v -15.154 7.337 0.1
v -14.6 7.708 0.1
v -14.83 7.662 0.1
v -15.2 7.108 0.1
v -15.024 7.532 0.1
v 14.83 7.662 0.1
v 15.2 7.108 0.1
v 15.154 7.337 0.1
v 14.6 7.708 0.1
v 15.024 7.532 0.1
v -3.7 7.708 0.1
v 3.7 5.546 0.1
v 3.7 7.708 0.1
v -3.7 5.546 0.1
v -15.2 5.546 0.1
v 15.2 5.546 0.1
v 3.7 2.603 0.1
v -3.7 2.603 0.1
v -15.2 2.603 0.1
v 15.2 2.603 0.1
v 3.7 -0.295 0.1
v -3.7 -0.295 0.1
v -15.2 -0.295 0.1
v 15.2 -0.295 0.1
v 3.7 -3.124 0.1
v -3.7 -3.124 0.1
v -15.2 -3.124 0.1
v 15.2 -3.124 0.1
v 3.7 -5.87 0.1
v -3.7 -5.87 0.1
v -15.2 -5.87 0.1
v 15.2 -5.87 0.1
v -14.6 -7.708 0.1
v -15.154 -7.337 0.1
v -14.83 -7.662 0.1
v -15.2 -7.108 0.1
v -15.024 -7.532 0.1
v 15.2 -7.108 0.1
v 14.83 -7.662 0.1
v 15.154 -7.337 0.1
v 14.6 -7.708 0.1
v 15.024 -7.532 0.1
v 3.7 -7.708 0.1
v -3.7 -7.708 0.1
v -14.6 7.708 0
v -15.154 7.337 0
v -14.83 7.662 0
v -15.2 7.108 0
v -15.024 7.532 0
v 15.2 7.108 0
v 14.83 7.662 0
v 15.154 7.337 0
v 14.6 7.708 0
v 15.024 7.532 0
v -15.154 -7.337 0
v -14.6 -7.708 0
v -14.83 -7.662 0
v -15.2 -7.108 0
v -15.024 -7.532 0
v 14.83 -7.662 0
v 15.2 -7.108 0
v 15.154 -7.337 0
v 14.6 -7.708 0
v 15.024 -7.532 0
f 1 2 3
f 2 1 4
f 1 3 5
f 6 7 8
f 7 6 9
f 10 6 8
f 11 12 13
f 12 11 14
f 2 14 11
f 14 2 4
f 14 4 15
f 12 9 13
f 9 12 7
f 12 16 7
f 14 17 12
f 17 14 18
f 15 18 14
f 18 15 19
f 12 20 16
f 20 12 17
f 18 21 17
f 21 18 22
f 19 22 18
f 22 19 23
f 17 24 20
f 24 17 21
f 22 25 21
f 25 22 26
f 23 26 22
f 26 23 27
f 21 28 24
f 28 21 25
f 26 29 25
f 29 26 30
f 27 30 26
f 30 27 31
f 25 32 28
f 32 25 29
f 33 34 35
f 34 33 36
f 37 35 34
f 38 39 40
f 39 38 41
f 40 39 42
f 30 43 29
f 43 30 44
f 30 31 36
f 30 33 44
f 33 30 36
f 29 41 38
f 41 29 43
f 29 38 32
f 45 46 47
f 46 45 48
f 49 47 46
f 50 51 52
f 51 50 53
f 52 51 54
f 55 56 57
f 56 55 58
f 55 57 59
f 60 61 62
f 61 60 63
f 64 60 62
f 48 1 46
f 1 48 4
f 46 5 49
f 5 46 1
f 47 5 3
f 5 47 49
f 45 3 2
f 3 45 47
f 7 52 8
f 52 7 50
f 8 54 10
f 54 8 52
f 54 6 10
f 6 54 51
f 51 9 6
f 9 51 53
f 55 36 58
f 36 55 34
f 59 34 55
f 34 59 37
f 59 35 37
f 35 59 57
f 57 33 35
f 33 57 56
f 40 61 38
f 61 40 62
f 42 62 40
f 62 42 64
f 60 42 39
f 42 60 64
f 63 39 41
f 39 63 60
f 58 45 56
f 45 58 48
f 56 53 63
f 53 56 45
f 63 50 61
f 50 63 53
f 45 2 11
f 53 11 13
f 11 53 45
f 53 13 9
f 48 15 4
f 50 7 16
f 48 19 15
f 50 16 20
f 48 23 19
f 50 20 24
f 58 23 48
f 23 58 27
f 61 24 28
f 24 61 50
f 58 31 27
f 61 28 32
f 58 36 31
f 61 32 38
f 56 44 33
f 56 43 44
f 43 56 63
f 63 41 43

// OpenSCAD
// file: ../p/1-4cyli.scad
use <../lib.scad>
function ldraw_lib__1_4cyli() = [
// 0 Cylinder 0.25
// 0 Name: 1-4cyli.dat
// 0 Author: James Jessiman
// 0 !LDRAW_ORG Primitive UPDATE 2012-01
// 0 !LICENSE Licensed under CC BY 2.0 and CC BY 4.0 : see CAreadme.txt
// 
// 0 BFC CERTIFY CCW
  [0,"BFC","CERTIFY"],
  [0,"BFC","CCW"],
// 
// 0 !HISTORY 2002-03-23 [sbliss] Added BFC statement.
// 0 !HISTORY 2002-04-25 [PTadmin] Official Update 2002-02
// 0 !HISTORY 2007-06-22 [PTadmin] Header formatted for Contributor Agreement
// 0 !HISTORY 2008-07-01 [PTadmin] Official Update 2008-01
// 0 !HISTORY 2012-02-16 [Philo] Changed to CCW
// 0 !HISTORY 2012-03-30 [PTadmin] Official Update 2012-01
// 
// 
// 4 16 1 1 0 0.9239 1 0.3827 0.9239 0 0.3827 1 0 0
  [4,16,1,1,0,0.9239,1,0.3827,0.9239,0,0.3827,1,0,0],
// 5 24 1 0 0 1 1 0 0.9239 0 0.3827 1 0 -1
  [5,24,1,0,0,1,1,0,0.9239,0,0.3827,1,0,-1],
// 4 16 0.9239 1 0.3827 0.7071 1 0.7071 0.7071 0 0.7071 0.9239 0 0.3827
  [4,16,0.9239,1,0.3827,0.7071,1,0.7071,0.7071,0,0.7071,0.9239,0,0.3827],
// 5 24 0.9239 0 0.3827 0.9239 1 0.3827 0.7071 0 0.7071 1 0 0
  [5,24,0.9239,0,0.3827,0.9239,1,0.3827,0.7071,0,0.7071,1,0,0],
// 4 16 0.7071 1 0.7071 0.3827 1 0.9239 0.3827 0 0.9239 0.7071 0 0.7071
  [4,16,0.7071,1,0.7071,0.3827,1,0.9239,0.3827,0,0.9239,0.7071,0,0.7071],
// 5 24 0.7071 0 0.7071 0.7071 1 0.7071 0.3827 0 0.9239 0.9239 0 0.3827
  [5,24,0.7071,0,0.7071,0.7071,1,0.7071,0.3827,0,0.9239,0.9239,0,0.3827],
// 4 16 0.3827 1 0.9239 0 1 1 0 0 1 0.3827 0 0.9239
  [4,16,0.3827,1,0.9239,0,1,1,0,0,1,0.3827,0,0.9239],
// 5 24 0.3827 0 0.9239 0.3827 1 0.9239 0 0 1 0.7071 0 0.7071
  [5,24,0.3827,0,0.9239,0.3827,1,0.9239,0,0,1,0.7071,0,0.7071],
// 5 24 0 0 1 0 1 1 0.3827 0 0.9239 -1 0 1
  [5,24,0,0,1,0,1,1,0.3827,0,0.9239,-1,0,1],
];
makepoly(ldraw_lib__1_4cyli(), line=0.2);
// file: ../p/1-4chrd.scad
use <../lib.scad>
function ldraw_lib__1_4chrd() = [
// 0 Chord 0.25
// 0 Name: 1-4chrd.dat
// 0 Author: Tony Hafner [hafhead]
// 0 !LDRAW_ORG Primitive UPDATE 2012-02
// 0 !LICENSE Licensed under CC BY 2.0 and CC BY 4.0 : see CAreadme.txt
// 
// 0 BFC CERTIFY CCW
  [0,"BFC","CERTIFY"],
  [0,"BFC","CCW"],
// 
// 0 !HISTORY 2004-04-22 [PTadmin] Official Update 2004-02
// 0 !HISTORY 2007-10-09 [PTadmin] Header formatted for Contributor Agreement
// 0 !HISTORY 2008-07-01 [PTadmin] Official Update 2008-01
// 0 !HISTORY 2012-08-02 [MMR1988] Re-creation with PrimGen2 and Rectifier
// 0 !HISTORY 2012-08-09 [PTadmin] Official Update 2012-02
// 
// 
// 4 16 0.9239 0 0.3827 0.3827 0 0.9239 0 0 1 1 0 0
  [4,16,0.9239,0,0.3827,0.3827,0,0.9239,0,0,1,1,0,0],
// 3 16 0.7071 0 0.7071 0.3827 0 0.9239 0.9239 0 0.3827
  [3,16,0.7071,0,0.7071,0.3827,0,0.9239,0.9239,0,0.3827],
];
makepoly(ldraw_lib__1_4chrd(), line=0.2);
// file: s/6142617es07.scad
use <../../lib.scad>
use <../../p/1-4chrd.scad>
use <../../p/1-4cyli.scad>
function ldraw_lib__s__6142617es07() = [
// 0 ~Sticker  1.9 x  3.8 with Black Stripe on White Background - Bottom Face
// 0 Name: s\6142617es07.dat
// 0 Author: Massimo Maso [Sirio]
// 0 !LDRAW_ORG Subpart UPDATE 2022-05
// 0 !LICENSE Licensed under CC BY 2.0 and CC BY 4.0 : see CAreadme.txt
// 
// 0 BFC CERTIFY CCW
  [0,"BFC","CERTIFY"],
  [0,"BFC","CCW"],
// 
// 0 !HISTORY 2022-09-15 [PTadmin] Official Update 2022-05
// 
// 
// 0 // Primitives
// 
// 1 16 -36.5 0 17.7691 -1.5 0 0 0 -1 0 0 0 1.5 1-4chrd.dat
  [1,16,-36.5,0,17.7691,-1.5,0,0,0,-1,0,0,0,1.5, ldraw_lib__1_4chrd()],
// 1 16 36.5 0 17.7691 1.5 0 0 0 -1 0 0 0 1.5 1-4chrd.dat
  [1,16,36.5,0,17.7691,1.5,0,0,0,-1,0,0,0,1.5, ldraw_lib__1_4chrd()],
// 1 16 -36.5 0 -17.7691 -1.5 0 0 0 -1 0 0 0 -1.5 1-4chrd.dat
  [1,16,-36.5,0,-17.7691,-1.5,0,0,0,-1,0,0,0,-1.5, ldraw_lib__1_4chrd()],
// 1 16 36.5 0 -17.7691 1.5 0 0 0 -1 0 0 0 -1.5 1-4chrd.dat
  [1,16,36.5,0,-17.7691,1.5,0,0,0,-1,0,0,0,-1.5, ldraw_lib__1_4chrd()],
// 1 16 -36.5 -0.25 17.7691 -1.5 0 0 0 0.25 0 0 0 1.5 1-4cyli.dat
  [1,16,-36.5,-0.25,17.7691,-1.5,0,0,0,0.25,0,0,0,1.5, ldraw_lib__1_4cyli()],
// 1 16 36.5 -0.25 17.7691 1.5 0 0 0 0.25 0 0 0 1.5 1-4cyli.dat
  [1,16,36.5,-0.25,17.7691,1.5,0,0,0,0.25,0,0,0,1.5, ldraw_lib__1_4cyli()],
// 1 16 -36.5 -0.25 -17.7691 -1.5 0 0 0 0.25 0 0 0 -1.5 1-4cyli.dat
  [1,16,-36.5,-0.25,-17.7691,-1.5,0,0,0,0.25,0,0,0,-1.5, ldraw_lib__1_4cyli()],
// 1 16 36.5 -0.25 -17.7691 1.5 0 0 0 0.25 0 0 0 -1.5 1-4cyli.dat
  [1,16,36.5,-0.25,-17.7691,1.5,0,0,0,0.25,0,0,0,-1.5, ldraw_lib__1_4cyli()],
// 0 // Bottom face
// 4 16 -36.5 0 19.2691 -36.5 0 -19.2691 -38 0 -17.7691 -38 0 17.7691
  [4,16,-36.5,0,19.2691,-36.5,0,-19.2691,-38,0,-17.7691,-38,0,17.7691],
// 4 16 -36.5 0 19.2691 36.5 0 19.2691 36.5 0 -19.2691 -36.5 0 -19.2691
  [4,16,-36.5,0,19.2691,36.5,0,19.2691,36.5,0,-19.2691,-36.5,0,-19.2691],
// 4 16 36.5 0 19.2691 38 0 17.7691 38 0 -17.7691 36.5 0 -19.2691
  [4,16,36.5,0,19.2691,38,0,17.7691,38,0,-17.7691,36.5,0,-19.2691],
// 0 // Lateral face
// 3 16 -36.5 0 19.2691 -36.5 -.25 19.2691 -9.25 -.25 19.2691
  [3,16,-36.5,0,19.2691,-36.5,-.25,19.2691,-9.25,-.25,19.2691],
// 4 16 -36.5 0 19.2691 -9.25 -.25 19.2691 9.25 -.25 19.2691 36.5 0 19.2691
  [4,16,-36.5,0,19.2691,-9.25,-.25,19.2691,9.25,-.25,19.2691,36.5,0,19.2691],
// 3 16 36.5 0 19.2691 9.25 -.25 19.2691 36.5 -.25 19.2691
  [3,16,36.5,0,19.2691,9.25,-.25,19.2691,36.5,-.25,19.2691],
// 3 16 -38 0 17.7691 -38 -.25 13.8648 -38 -.25 17.7691
  [3,16,-38,0,17.7691,-38,-.25,13.8648,-38,-.25,17.7691],
// 3 16 38 0 17.7691 38 -.25 17.7691 38 -.25 13.8648
  [3,16,38,0,17.7691,38,-.25,17.7691,38,-.25,13.8648],
// 3 16 -38 0 17.7691 -38 -.25 6.5068 -38 -.25 13.8648
  [3,16,-38,0,17.7691,-38,-.25,6.5068,-38,-.25,13.8648],
// 3 16 38 0 17.7691 38 -.25 13.8648 38 -.25 6.5068
  [3,16,38,0,17.7691,38,-.25,13.8648,38,-.25,6.5068],
// 3 16 -38 0 17.7691 -38 -.25 -.7365 -38 -.25 6.5068
  [3,16,-38,0,17.7691,-38,-.25,-.7365,-38,-.25,6.5068],
// 3 16 38 0 17.7691 38 -.25 6.5068 38 -.25 -.7365
  [3,16,38,0,17.7691,38,-.25,6.5068,38,-.25,-.7365],
// 4 16 -38 0 17.7691 -38 0 -17.7691 -38 -.25 -7.8105 -38 -.25 -.7365
  [4,16,-38,0,17.7691,-38,0,-17.7691,-38,-.25,-7.8105,-38,-.25,-.7365],
// 4 16 38 0 17.7691 38 -.25 -.7365 38 -.25 -7.8105 38 0 -17.7691
  [4,16,38,0,17.7691,38,-.25,-.7365,38,-.25,-7.8105,38,0,-17.7691],
// 3 16 -38 0 -17.7691 -38 -.25 -14.6749 -38 -.25 -7.8105
  [3,16,-38,0,-17.7691,-38,-.25,-14.6749,-38,-.25,-7.8105],
// 3 16 38 0 -17.7691 38 -.25 -7.8105 38 -.25 -14.6749
  [3,16,38,0,-17.7691,38,-.25,-7.8105,38,-.25,-14.6749],
// 3 16 -38 0 -17.7691 -38 -.25 -17.7691 -38 -.25 -14.6749
  [3,16,-38,0,-17.7691,-38,-.25,-17.7691,-38,-.25,-14.6749],
// 3 16 38 0 -17.7691 38 -.25 -14.6749 38 -.25 -17.7691
  [3,16,38,0,-17.7691,38,-.25,-14.6749,38,-.25,-17.7691],
// 3 16 -36.5 0 -19.2691 -9.25 -.25 -19.2691 -36.5 -.25 -19.2691
  [3,16,-36.5,0,-19.2691,-9.25,-.25,-19.2691,-36.5,-.25,-19.2691],
// 4 16 -36.5 0 -19.2691 36.5 0 -19.2691 9.25 -.25 -19.2691 -9.25 -.25 -19.2691
  [4,16,-36.5,0,-19.2691,36.5,0,-19.2691,9.25,-.25,-19.2691,-9.25,-.25,-19.2691],
// 3 16 36.5 0 -19.2691 36.5 -.25 -19.2691 9.25 -.25 -19.2691
  [3,16,36.5,0,-19.2691,36.5,-.25,-19.2691,9.25,-.25,-19.2691],
];
makepoly(ldraw_lib__s__6142617es07(), line=0.2);
// file: s/6142617es06.scad
use <../../lib.scad>
use <../../p/1-4chrd.scad>
function ldraw_lib__s__6142617es06() = [
// 0 ~Sticker  1.9 x  3.8 with Black Stripe on White Background - Sixth Face
// 0 Name: s\6142617es06.dat
// 0 Author: Massimo Maso [Sirio]
// 0 !LDRAW_ORG Subpart UPDATE 2022-05
// 0 !LICENSE Licensed under CC BY 2.0 and CC BY 4.0 : see CAreadme.txt
// 
// 0 BFC CERTIFY CCW
  [0,"BFC","CERTIFY"],
  [0,"BFC","CCW"],
// 
// 0 !HISTORY 2022-09-15 [PTadmin] Official Update 2022-05
// 
// 
// 0 // Primitives
// 
// 1 15 -36.5 -.25 -3.0797 -1.5 0 0 0 1 0 0 0 -1.5 1-4chrd.dat
  [1,15,-36.5,-.25,-3.0797,-1.5,0,0,0,1,0,0,0,-1.5, ldraw_lib__1_4chrd()],
// 1 15 36.5 -.25 -3.0797 1.5 0 0 0 1 0 0 0 -1.5 1-4chrd.dat
  [1,15,36.5,-.25,-3.0797,1.5,0,0,0,1,0,0,0,-1.5, ldraw_lib__1_4chrd()],
// 0 // Blue face
// 4 0 -9.25 -.25 .0145 -9.25 -.25 -4.5797 9.25 -.25 -4.5797 9.25 -.25 .0145
  [4,0,-9.25,-.25,.0145,-9.25,-.25,-4.5797,9.25,-.25,-4.5797,9.25,-.25,.0145],
// 0 // White faces
// 3 15 -9.25 -.25 .0145 -38 -.25 .0145 -38 -.25 -3.0797
  [3,15,-9.25,-.25,.0145,-38,-.25,.0145,-38,-.25,-3.0797],
// 4 15 -9.25 -.25 .0145 -38 -.25 -3.0797 -36.5 -.25 -4.5797 -9.25 -.25 -4.5797
  [4,15,-9.25,-.25,.0145,-38,-.25,-3.0797,-36.5,-.25,-4.5797,-9.25,-.25,-4.5797],
// 4 15 9.25 -.25 .0145 9.25 -.25 -4.5797 36.5 -.25 -4.5797 38 -.25 -3.0797
  [4,15,9.25,-.25,.0145,9.25,-.25,-4.5797,36.5,-.25,-4.5797,38,-.25,-3.0797],
// 3 15 9.25 -.25 .0145 38 -.25 -3.0797 38 -.25 .0145
  [3,15,9.25,-.25,.0145,38,-.25,-3.0797,38,-.25,.0145],
];
makepoly(ldraw_lib__s__6142617es06(), line=0.2);
// file: s/6142617es05.scad
use <../../lib.scad>
function ldraw_lib__s__6142617es05() = [
// 0 ~Sticker  1.9 x  3.8 with Black Stripe on White Background - Fifth Face
// 0 Name: s\6142617es05.dat
// 0 Author: Massimo Maso [Sirio]
// 0 !LDRAW_ORG Subpart UPDATE 2022-05
// 0 !LICENSE Licensed under CC BY 2.0 and CC BY 4.0 : see CAreadme.txt
// 
// 0 BFC CERTIFY CCW
  [0,"BFC","CERTIFY"],
  [0,"BFC","CCW"],
// 
// 0 !HISTORY 2022-09-15 [PTadmin] Official Update 2022-05
// 
// 
// 0 // Black face
// 
// 4 0 -9.25 -.25 6.8499 -9.25 -.25 -.0145 9.25 -.25 -.0145 9.25 -.25 6.8499
  [4,0,-9.25,-.25,6.8499,-9.25,-.25,-.0145,9.25,-.25,-.0145,9.25,-.25,6.8499],
// 0 // White faces
// 4 15 -9.25 -.25 6.8499 -38 -.25 6.8499 -38 -.25 -.0145 -9.25 -.25 -.0145
  [4,15,-9.25,-.25,6.8499,-38,-.25,6.8499,-38,-.25,-.0145,-9.25,-.25,-.0145],
// 4 15 38 -.25 -.0145 38 -.25 6.8499 9.25 -.25 6.8499 9.25 -.25 -.0145
  [4,15,38,-.25,-.0145,38,-.25,6.8499,9.25,-.25,6.8499,9.25,-.25,-.0145],
];
makepoly(ldraw_lib__s__6142617es05(), line=0.2);
// file: s/6142617es04.scad
use <../../lib.scad>
function ldraw_lib__s__6142617es04() = [
// 0 ~Sticker  1.9 x  3.8 with Black Stripe on White Background - Fourth Face
// 0 Name: s\6142617es04.dat
// 0 Author: Massimo Maso [Sirio]
// 0 !LDRAW_ORG Subpart UPDATE 2022-05
// 0 !LICENSE Licensed under CC BY 2.0 and CC BY 4.0 : see CAreadme.txt
// 
// 0 BFC CERTIFY CCW
  [0,"BFC","CERTIFY"],
  [0,"BFC","CCW"],
// 
// 0 !HISTORY 2022-09-15 [PTadmin] Official Update 2022-05
// 
// 
// 0 // Black face
// 
// 4 0 -9.25 -.25 .0128 -9.25 -.25 -7.0612 9.25 -.25 -7.0612 9.25 -.25 .0128
  [4,0,-9.25,-.25,.0128,-9.25,-.25,-7.0612,9.25,-.25,-7.0612,9.25,-.25,.0128],
// 0 // White faces
// 4 15 -9.25 -.25 .0128 -38 -.25 .0128 -38 -.25 -7.0612 -9.25 -.25 -7.0612
  [4,15,-9.25,-.25,.0128,-38,-.25,.0128,-38,-.25,-7.0612,-9.25,-.25,-7.0612],
// 4 15 38 -.25 -7.0612 38 -.25 .0128 9.25 -.25 .0128 9.25 -.25 -7.0612
  [4,15,38,-.25,-7.0612,38,-.25,.0128,9.25,-.25,.0128,9.25,-.25,-7.0612],
];
makepoly(ldraw_lib__s__6142617es04(), line=0.2);
// file: s/6142617es03.scad
use <../../lib.scad>
function ldraw_lib__s__6142617es03() = [
// 0 ~Sticker  1.9 x  3.8 with Black Stripe on White Background - Third Face
// 0 Name: s\6142617es03.dat
// 0 Author: Massimo Maso [Sirio]
// 0 !LDRAW_ORG Subpart UPDATE 2022-05
// 0 !LICENSE Licensed under CC BY 2.0 and CC BY 4.0 : see CAreadme.txt
// 
// 0 BFC CERTIFY CCW
  [0,"BFC","CERTIFY"],
  [0,"BFC","CCW"],
// 
// 0 !HISTORY 2022-09-15 [PTadmin] Official Update 2022-05
// 
// 
// 0 // Black face
// 
// 4 0 -9.25 -.25 7.2305 -9.25 -.25 -.0128 9.25 -.25 -.0128 9.25 -.25 7.2305
  [4,0,-9.25,-.25,7.2305,-9.25,-.25,-.0128,9.25,-.25,-.0128,9.25,-.25,7.2305],
// 0 // White faces
// 4 15 -9.25 -.25 7.2305 -38 -.25 7.2305 -38 -.25 -.0128 -9.25 -.25 -.0128
  [4,15,-9.25,-.25,7.2305,-38,-.25,7.2305,-38,-.25,-.0128,-9.25,-.25,-.0128],
// 4 15 38 -.25 -.0128 38 -.25 7.2305 9.25 -.25 7.2305 9.25 -.25 -.0128
  [4,15,38,-.25,-.0128,38,-.25,7.2305,9.25,-.25,7.2305,9.25,-.25,-.0128],
];
makepoly(ldraw_lib__s__6142617es03(), line=0.2);
// file: s/6142617es02.scad
use <../../lib.scad>
function ldraw_lib__s__6142617es02() = [
// 0 ~Sticker  1.9 x  3.8 with Black Stripe on White Background - Second Face
// 0 Name: s\6142617es02.dat
// 0 Author: Massimo Maso [Sirio]
// 0 !LDRAW_ORG Subpart UPDATE 2022-05
// 0 !LICENSE Licensed under CC BY 2.0 and CC BY 4.0 : see CAreadme.txt
// 
// 0 BFC CERTIFY CCW
  [0,"BFC","CERTIFY"],
  [0,"BFC","CCW"],
// 
// 0 !HISTORY 2022-09-15 [PTadmin] Official Update 2022-05
// 
// 
// 0 // Black face
// 
// 4 0 -9.25 -.25 -7.3463 9.25 -.25 -7.3463 9.25 -.25 .0117 -9.25 -.25 .0117
  [4,0,-9.25,-.25,-7.3463,9.25,-.25,-7.3463,9.25,-.25,.0117,-9.25,-.25,.0117],
// 0 // White faces
// 4 15 -9.25 -.25 .0117 -38 -.25 .0117 -38 -.25 -7.3463 -9.25 -.25 -7.3463
  [4,15,-9.25,-.25,.0117,-38,-.25,.0117,-38,-.25,-7.3463,-9.25,-.25,-7.3463],
// 4 15 38 -.25 -7.3463 38 -.25 .0117 9.25 -.25 .0117 9.25 -.25 -7.3463
  [4,15,38,-.25,-7.3463,38,-.25,.0117,9.25,-.25,.0117,9.25,-.25,-7.3463],
];
makepoly(ldraw_lib__s__6142617es02(), line=0.2);
// file: s/6142617es01.scad
use <../../lib.scad>
use <../../p/1-4chrd.scad>
function ldraw_lib__s__6142617es01() = [
// 0 ~Sticker  1.9 x  3.8 with Black Stripe on White Background - First Face
// 0 Name: s\6142617es01.dat
// 0 Author: Massimo Maso [Sirio]
// 0 !LDRAW_ORG Subpart UPDATE 2022-05
// 0 !LICENSE Licensed under CC BY 2.0 and CC BY 4.0 : see CAreadme.txt
// 
// 0 BFC CERTIFY CCW
  [0,"BFC","CERTIFY"],
  [0,"BFC","CCW"],
// 
// 0 !HISTORY 2022-09-15 [PTadmin] Official Update 2022-05
// 
// 
// 0 // Primitives
// 
// 1 15 -36.5 -.25 3.8926 -1.5 0 0 0 1 0 0 0 1.5 1-4chrd.dat
  [1,15,-36.5,-.25,3.8926,-1.5,0,0,0,1,0,0,0,1.5, ldraw_lib__1_4chrd()],
// 1 15 36.5 -.25 3.8926 1.5 0 0 0 1 0 0 0 1.5 1-4chrd.dat
  [1,15,36.5,-.25,3.8926,1.5,0,0,0,1,0,0,0,1.5, ldraw_lib__1_4chrd()],
// 0 // Black face
// 4 0 -9.25 -.25 -.0117 9.25 -.25 -.0117 9.25 -.25 5.3926 -9.25 -.25 5.3926
  [4,0,-9.25,-.25,-.0117,9.25,-.25,-.0117,9.25,-.25,5.3926,-9.25,-.25,5.3926],
// 0 // White Faces
// 4 15 -9.25 -.25 -.0117 -9.25 -.25 5.3926 -36.5 -.25 5.3926 -38 -.25 3.8926
  [4,15,-9.25,-.25,-.0117,-9.25,-.25,5.3926,-36.5,-.25,5.3926,-38,-.25,3.8926],
// 3 15 -9.25 -.25 -.0117 -38 -.25 3.8926 -38 -.25 -.0117
  [3,15,-9.25,-.25,-.0117,-38,-.25,3.8926,-38,-.25,-.0117],
// 4 15 9.25 -.25 -.0117 38 -.25 3.8926 36.5 -.25 5.3926 9.25 -.25 5.3926
  [4,15,9.25,-.25,-.0117,38,-.25,3.8926,36.5,-.25,5.3926,9.25,-.25,5.3926],
// 3 15 9.25 -.25 -.0117 38 -.25 -.0117 38 -.25 3.8926
  [3,15,9.25,-.25,-.0117,38,-.25,-.0117,38,-.25,3.8926],
];
makepoly(ldraw_lib__s__6142617es01(), line=0.2);
// main file
use <../lib.scad>
use <s/6142617es01.scad>
use <s/6142617es02.scad>
use <s/6142617es03.scad>
use <s/6142617es04.scad>
use <s/6142617es05.scad>
use <s/6142617es06.scad>
use <s/6142617es07.scad>
function ldraw_lib__6142617e() = [
// 0 Sticker  1.9 x  3.8 with Black Stripe on White Background
// 0 Name: 6142617e.dat
// 0 Author: Massimo Maso [Sirio]
// 0 !LDRAW_ORG Part UPDATE 2022-05
// 0 !LICENSE Licensed under CC BY 2.0 and CC BY 4.0 : see CAreadme.txt
// 
// 0 BFC CERTIFY CCW
  [0,"BFC","CERTIFY"],
  [0,"BFC","CCW"],
// 
// 0 !KEYWORDS 1969, Camaro, Chevrolet, Drag, Race, Set 75874, Speed Champions
// 0 !KEYWORDS Z/28
// 
// 0 !HISTORY 2022-09-15 [PTadmin] Official Update 2022-05
// 
// 
// 1 16 0 0 13.8765 1 0 0 0 1 0 0 0 1 s\6142617es01.dat
  [1,16,0,0,13.8765,1,0,0,0,1,0,0,0,1, ldraw_lib__s__6142617es01()],
// 1 16 0 0 13.8531 1 0 0 0 1 0 0 0 1 s\6142617es02.dat
  [1,16,0,0,13.8531,1,0,0,0,1,0,0,0,1, ldraw_lib__s__6142617es02()],
// 1 16 0 0 -.7237 1 0 0 0 1 0 0 0 1 s\6142617es03.dat
  [1,16,0,0,-.7237,1,0,0,0,1,0,0,0,1, ldraw_lib__s__6142617es03()],
// 1 16 0 0 -.7493 1 0 0 0 1 0 0 0 1 s\6142617es04.dat
  [1,16,0,0,-.7493,1,0,0,0,1,0,0,0,1, ldraw_lib__s__6142617es04()],
// 1 16 0 0 -14.6604 1 0 0 0 1 0 0 0 1 s\6142617es05.dat
  [1,16,0,0,-14.6604,1,0,0,0,1,0,0,0,1, ldraw_lib__s__6142617es05()],
// 1 16 0 0 -14.6894 1 0 0 0 1 0 0 0 1 s\6142617es06.dat
  [1,16,0,0,-14.6894,1,0,0,0,1,0,0,0,1, ldraw_lib__s__6142617es06()],
// 1 16 0 0 0 1 0 0 0 1 0 0 0 1 s\6142617es07.dat
  [1,16,0,0,0,1,0,0,0,1,0,0,0,1, ldraw_lib__s__6142617es07()],
];
makepoly(ldraw_lib__6142617e(), line=0.2);
